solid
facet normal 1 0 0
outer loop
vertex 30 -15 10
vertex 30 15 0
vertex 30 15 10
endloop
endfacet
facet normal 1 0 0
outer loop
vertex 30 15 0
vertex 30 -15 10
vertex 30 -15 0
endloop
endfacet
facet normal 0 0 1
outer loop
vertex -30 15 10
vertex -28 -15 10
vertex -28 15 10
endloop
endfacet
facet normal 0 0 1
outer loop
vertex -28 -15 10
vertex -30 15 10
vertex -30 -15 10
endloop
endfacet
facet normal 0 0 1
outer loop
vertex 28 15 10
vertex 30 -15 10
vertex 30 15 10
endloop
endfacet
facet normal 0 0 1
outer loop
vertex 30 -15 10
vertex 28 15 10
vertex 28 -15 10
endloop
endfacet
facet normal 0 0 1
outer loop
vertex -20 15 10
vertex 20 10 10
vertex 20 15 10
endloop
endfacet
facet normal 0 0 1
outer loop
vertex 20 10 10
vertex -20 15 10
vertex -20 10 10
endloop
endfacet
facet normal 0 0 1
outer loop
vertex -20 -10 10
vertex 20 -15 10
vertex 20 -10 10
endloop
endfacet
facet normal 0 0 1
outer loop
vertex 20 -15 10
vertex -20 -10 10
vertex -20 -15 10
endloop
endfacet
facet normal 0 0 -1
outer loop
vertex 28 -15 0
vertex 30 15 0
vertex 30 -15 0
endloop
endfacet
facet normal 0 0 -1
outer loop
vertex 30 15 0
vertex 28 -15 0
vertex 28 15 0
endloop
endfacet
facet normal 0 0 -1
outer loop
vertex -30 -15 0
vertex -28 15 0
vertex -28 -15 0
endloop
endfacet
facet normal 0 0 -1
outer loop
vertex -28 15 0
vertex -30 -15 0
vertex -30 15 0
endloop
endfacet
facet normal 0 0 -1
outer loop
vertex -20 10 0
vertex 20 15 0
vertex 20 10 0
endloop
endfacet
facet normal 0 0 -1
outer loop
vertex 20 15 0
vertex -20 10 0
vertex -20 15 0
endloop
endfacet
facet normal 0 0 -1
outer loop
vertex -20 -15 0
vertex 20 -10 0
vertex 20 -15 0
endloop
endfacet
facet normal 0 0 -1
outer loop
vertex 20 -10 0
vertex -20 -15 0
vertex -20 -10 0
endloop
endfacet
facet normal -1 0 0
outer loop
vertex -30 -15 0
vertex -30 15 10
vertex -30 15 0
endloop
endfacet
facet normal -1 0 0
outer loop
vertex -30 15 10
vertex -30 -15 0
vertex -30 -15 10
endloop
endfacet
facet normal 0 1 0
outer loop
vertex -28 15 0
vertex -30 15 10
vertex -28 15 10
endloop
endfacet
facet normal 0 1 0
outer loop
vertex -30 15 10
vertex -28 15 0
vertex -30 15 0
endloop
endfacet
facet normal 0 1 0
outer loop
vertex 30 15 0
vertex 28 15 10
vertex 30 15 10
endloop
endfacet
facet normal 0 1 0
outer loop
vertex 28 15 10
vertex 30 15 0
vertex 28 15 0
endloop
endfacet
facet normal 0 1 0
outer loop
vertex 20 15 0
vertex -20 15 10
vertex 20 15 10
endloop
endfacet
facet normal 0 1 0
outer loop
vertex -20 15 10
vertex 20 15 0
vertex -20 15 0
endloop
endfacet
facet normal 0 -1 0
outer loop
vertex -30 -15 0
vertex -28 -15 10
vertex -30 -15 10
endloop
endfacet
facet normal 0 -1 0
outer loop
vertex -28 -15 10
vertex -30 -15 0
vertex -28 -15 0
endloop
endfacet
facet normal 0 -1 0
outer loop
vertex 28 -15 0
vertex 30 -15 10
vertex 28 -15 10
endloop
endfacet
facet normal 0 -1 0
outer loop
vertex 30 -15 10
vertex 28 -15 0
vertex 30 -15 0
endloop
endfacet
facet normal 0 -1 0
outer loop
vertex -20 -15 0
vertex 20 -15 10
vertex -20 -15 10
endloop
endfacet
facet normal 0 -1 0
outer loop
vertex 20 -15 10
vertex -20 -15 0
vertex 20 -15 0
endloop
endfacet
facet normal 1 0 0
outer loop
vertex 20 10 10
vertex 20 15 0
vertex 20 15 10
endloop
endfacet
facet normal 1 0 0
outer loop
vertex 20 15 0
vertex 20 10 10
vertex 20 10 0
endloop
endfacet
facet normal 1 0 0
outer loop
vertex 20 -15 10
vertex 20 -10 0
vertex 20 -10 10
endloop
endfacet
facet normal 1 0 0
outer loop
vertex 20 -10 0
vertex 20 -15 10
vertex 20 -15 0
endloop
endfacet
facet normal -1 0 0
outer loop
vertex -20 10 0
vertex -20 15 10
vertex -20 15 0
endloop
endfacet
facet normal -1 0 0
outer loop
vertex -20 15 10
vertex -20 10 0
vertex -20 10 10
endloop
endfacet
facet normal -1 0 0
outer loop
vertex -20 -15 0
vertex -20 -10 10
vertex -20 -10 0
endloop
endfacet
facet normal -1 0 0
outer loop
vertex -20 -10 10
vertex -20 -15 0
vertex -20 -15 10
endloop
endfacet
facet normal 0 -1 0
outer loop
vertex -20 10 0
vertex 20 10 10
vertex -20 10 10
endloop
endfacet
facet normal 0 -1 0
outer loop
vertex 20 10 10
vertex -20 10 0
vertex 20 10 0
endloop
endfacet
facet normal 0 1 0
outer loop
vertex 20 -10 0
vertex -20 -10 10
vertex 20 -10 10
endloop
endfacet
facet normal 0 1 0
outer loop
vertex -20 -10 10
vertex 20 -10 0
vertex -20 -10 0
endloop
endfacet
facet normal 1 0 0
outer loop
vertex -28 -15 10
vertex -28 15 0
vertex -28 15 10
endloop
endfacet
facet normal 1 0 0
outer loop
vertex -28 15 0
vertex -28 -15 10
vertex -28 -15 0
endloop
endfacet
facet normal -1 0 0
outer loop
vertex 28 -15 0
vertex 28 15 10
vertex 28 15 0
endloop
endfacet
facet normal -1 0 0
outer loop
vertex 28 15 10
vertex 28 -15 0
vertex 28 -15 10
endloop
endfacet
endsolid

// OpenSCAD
module panel_meter() {
    difference() {
        // Main body
        translate([-30, -15, 0])
        cube([60, 30, 10]);

        // Display cutout
        translate([-20, -10, -1])
        cube([40, 20, 11]);

        // Terminal cutouts
        translate([-28, -15, -1])
        cube([8, 30, 11]);
        translate([20, -15, -1])
        cube([8, 30, 11]);
    }
}

panel_meter();
